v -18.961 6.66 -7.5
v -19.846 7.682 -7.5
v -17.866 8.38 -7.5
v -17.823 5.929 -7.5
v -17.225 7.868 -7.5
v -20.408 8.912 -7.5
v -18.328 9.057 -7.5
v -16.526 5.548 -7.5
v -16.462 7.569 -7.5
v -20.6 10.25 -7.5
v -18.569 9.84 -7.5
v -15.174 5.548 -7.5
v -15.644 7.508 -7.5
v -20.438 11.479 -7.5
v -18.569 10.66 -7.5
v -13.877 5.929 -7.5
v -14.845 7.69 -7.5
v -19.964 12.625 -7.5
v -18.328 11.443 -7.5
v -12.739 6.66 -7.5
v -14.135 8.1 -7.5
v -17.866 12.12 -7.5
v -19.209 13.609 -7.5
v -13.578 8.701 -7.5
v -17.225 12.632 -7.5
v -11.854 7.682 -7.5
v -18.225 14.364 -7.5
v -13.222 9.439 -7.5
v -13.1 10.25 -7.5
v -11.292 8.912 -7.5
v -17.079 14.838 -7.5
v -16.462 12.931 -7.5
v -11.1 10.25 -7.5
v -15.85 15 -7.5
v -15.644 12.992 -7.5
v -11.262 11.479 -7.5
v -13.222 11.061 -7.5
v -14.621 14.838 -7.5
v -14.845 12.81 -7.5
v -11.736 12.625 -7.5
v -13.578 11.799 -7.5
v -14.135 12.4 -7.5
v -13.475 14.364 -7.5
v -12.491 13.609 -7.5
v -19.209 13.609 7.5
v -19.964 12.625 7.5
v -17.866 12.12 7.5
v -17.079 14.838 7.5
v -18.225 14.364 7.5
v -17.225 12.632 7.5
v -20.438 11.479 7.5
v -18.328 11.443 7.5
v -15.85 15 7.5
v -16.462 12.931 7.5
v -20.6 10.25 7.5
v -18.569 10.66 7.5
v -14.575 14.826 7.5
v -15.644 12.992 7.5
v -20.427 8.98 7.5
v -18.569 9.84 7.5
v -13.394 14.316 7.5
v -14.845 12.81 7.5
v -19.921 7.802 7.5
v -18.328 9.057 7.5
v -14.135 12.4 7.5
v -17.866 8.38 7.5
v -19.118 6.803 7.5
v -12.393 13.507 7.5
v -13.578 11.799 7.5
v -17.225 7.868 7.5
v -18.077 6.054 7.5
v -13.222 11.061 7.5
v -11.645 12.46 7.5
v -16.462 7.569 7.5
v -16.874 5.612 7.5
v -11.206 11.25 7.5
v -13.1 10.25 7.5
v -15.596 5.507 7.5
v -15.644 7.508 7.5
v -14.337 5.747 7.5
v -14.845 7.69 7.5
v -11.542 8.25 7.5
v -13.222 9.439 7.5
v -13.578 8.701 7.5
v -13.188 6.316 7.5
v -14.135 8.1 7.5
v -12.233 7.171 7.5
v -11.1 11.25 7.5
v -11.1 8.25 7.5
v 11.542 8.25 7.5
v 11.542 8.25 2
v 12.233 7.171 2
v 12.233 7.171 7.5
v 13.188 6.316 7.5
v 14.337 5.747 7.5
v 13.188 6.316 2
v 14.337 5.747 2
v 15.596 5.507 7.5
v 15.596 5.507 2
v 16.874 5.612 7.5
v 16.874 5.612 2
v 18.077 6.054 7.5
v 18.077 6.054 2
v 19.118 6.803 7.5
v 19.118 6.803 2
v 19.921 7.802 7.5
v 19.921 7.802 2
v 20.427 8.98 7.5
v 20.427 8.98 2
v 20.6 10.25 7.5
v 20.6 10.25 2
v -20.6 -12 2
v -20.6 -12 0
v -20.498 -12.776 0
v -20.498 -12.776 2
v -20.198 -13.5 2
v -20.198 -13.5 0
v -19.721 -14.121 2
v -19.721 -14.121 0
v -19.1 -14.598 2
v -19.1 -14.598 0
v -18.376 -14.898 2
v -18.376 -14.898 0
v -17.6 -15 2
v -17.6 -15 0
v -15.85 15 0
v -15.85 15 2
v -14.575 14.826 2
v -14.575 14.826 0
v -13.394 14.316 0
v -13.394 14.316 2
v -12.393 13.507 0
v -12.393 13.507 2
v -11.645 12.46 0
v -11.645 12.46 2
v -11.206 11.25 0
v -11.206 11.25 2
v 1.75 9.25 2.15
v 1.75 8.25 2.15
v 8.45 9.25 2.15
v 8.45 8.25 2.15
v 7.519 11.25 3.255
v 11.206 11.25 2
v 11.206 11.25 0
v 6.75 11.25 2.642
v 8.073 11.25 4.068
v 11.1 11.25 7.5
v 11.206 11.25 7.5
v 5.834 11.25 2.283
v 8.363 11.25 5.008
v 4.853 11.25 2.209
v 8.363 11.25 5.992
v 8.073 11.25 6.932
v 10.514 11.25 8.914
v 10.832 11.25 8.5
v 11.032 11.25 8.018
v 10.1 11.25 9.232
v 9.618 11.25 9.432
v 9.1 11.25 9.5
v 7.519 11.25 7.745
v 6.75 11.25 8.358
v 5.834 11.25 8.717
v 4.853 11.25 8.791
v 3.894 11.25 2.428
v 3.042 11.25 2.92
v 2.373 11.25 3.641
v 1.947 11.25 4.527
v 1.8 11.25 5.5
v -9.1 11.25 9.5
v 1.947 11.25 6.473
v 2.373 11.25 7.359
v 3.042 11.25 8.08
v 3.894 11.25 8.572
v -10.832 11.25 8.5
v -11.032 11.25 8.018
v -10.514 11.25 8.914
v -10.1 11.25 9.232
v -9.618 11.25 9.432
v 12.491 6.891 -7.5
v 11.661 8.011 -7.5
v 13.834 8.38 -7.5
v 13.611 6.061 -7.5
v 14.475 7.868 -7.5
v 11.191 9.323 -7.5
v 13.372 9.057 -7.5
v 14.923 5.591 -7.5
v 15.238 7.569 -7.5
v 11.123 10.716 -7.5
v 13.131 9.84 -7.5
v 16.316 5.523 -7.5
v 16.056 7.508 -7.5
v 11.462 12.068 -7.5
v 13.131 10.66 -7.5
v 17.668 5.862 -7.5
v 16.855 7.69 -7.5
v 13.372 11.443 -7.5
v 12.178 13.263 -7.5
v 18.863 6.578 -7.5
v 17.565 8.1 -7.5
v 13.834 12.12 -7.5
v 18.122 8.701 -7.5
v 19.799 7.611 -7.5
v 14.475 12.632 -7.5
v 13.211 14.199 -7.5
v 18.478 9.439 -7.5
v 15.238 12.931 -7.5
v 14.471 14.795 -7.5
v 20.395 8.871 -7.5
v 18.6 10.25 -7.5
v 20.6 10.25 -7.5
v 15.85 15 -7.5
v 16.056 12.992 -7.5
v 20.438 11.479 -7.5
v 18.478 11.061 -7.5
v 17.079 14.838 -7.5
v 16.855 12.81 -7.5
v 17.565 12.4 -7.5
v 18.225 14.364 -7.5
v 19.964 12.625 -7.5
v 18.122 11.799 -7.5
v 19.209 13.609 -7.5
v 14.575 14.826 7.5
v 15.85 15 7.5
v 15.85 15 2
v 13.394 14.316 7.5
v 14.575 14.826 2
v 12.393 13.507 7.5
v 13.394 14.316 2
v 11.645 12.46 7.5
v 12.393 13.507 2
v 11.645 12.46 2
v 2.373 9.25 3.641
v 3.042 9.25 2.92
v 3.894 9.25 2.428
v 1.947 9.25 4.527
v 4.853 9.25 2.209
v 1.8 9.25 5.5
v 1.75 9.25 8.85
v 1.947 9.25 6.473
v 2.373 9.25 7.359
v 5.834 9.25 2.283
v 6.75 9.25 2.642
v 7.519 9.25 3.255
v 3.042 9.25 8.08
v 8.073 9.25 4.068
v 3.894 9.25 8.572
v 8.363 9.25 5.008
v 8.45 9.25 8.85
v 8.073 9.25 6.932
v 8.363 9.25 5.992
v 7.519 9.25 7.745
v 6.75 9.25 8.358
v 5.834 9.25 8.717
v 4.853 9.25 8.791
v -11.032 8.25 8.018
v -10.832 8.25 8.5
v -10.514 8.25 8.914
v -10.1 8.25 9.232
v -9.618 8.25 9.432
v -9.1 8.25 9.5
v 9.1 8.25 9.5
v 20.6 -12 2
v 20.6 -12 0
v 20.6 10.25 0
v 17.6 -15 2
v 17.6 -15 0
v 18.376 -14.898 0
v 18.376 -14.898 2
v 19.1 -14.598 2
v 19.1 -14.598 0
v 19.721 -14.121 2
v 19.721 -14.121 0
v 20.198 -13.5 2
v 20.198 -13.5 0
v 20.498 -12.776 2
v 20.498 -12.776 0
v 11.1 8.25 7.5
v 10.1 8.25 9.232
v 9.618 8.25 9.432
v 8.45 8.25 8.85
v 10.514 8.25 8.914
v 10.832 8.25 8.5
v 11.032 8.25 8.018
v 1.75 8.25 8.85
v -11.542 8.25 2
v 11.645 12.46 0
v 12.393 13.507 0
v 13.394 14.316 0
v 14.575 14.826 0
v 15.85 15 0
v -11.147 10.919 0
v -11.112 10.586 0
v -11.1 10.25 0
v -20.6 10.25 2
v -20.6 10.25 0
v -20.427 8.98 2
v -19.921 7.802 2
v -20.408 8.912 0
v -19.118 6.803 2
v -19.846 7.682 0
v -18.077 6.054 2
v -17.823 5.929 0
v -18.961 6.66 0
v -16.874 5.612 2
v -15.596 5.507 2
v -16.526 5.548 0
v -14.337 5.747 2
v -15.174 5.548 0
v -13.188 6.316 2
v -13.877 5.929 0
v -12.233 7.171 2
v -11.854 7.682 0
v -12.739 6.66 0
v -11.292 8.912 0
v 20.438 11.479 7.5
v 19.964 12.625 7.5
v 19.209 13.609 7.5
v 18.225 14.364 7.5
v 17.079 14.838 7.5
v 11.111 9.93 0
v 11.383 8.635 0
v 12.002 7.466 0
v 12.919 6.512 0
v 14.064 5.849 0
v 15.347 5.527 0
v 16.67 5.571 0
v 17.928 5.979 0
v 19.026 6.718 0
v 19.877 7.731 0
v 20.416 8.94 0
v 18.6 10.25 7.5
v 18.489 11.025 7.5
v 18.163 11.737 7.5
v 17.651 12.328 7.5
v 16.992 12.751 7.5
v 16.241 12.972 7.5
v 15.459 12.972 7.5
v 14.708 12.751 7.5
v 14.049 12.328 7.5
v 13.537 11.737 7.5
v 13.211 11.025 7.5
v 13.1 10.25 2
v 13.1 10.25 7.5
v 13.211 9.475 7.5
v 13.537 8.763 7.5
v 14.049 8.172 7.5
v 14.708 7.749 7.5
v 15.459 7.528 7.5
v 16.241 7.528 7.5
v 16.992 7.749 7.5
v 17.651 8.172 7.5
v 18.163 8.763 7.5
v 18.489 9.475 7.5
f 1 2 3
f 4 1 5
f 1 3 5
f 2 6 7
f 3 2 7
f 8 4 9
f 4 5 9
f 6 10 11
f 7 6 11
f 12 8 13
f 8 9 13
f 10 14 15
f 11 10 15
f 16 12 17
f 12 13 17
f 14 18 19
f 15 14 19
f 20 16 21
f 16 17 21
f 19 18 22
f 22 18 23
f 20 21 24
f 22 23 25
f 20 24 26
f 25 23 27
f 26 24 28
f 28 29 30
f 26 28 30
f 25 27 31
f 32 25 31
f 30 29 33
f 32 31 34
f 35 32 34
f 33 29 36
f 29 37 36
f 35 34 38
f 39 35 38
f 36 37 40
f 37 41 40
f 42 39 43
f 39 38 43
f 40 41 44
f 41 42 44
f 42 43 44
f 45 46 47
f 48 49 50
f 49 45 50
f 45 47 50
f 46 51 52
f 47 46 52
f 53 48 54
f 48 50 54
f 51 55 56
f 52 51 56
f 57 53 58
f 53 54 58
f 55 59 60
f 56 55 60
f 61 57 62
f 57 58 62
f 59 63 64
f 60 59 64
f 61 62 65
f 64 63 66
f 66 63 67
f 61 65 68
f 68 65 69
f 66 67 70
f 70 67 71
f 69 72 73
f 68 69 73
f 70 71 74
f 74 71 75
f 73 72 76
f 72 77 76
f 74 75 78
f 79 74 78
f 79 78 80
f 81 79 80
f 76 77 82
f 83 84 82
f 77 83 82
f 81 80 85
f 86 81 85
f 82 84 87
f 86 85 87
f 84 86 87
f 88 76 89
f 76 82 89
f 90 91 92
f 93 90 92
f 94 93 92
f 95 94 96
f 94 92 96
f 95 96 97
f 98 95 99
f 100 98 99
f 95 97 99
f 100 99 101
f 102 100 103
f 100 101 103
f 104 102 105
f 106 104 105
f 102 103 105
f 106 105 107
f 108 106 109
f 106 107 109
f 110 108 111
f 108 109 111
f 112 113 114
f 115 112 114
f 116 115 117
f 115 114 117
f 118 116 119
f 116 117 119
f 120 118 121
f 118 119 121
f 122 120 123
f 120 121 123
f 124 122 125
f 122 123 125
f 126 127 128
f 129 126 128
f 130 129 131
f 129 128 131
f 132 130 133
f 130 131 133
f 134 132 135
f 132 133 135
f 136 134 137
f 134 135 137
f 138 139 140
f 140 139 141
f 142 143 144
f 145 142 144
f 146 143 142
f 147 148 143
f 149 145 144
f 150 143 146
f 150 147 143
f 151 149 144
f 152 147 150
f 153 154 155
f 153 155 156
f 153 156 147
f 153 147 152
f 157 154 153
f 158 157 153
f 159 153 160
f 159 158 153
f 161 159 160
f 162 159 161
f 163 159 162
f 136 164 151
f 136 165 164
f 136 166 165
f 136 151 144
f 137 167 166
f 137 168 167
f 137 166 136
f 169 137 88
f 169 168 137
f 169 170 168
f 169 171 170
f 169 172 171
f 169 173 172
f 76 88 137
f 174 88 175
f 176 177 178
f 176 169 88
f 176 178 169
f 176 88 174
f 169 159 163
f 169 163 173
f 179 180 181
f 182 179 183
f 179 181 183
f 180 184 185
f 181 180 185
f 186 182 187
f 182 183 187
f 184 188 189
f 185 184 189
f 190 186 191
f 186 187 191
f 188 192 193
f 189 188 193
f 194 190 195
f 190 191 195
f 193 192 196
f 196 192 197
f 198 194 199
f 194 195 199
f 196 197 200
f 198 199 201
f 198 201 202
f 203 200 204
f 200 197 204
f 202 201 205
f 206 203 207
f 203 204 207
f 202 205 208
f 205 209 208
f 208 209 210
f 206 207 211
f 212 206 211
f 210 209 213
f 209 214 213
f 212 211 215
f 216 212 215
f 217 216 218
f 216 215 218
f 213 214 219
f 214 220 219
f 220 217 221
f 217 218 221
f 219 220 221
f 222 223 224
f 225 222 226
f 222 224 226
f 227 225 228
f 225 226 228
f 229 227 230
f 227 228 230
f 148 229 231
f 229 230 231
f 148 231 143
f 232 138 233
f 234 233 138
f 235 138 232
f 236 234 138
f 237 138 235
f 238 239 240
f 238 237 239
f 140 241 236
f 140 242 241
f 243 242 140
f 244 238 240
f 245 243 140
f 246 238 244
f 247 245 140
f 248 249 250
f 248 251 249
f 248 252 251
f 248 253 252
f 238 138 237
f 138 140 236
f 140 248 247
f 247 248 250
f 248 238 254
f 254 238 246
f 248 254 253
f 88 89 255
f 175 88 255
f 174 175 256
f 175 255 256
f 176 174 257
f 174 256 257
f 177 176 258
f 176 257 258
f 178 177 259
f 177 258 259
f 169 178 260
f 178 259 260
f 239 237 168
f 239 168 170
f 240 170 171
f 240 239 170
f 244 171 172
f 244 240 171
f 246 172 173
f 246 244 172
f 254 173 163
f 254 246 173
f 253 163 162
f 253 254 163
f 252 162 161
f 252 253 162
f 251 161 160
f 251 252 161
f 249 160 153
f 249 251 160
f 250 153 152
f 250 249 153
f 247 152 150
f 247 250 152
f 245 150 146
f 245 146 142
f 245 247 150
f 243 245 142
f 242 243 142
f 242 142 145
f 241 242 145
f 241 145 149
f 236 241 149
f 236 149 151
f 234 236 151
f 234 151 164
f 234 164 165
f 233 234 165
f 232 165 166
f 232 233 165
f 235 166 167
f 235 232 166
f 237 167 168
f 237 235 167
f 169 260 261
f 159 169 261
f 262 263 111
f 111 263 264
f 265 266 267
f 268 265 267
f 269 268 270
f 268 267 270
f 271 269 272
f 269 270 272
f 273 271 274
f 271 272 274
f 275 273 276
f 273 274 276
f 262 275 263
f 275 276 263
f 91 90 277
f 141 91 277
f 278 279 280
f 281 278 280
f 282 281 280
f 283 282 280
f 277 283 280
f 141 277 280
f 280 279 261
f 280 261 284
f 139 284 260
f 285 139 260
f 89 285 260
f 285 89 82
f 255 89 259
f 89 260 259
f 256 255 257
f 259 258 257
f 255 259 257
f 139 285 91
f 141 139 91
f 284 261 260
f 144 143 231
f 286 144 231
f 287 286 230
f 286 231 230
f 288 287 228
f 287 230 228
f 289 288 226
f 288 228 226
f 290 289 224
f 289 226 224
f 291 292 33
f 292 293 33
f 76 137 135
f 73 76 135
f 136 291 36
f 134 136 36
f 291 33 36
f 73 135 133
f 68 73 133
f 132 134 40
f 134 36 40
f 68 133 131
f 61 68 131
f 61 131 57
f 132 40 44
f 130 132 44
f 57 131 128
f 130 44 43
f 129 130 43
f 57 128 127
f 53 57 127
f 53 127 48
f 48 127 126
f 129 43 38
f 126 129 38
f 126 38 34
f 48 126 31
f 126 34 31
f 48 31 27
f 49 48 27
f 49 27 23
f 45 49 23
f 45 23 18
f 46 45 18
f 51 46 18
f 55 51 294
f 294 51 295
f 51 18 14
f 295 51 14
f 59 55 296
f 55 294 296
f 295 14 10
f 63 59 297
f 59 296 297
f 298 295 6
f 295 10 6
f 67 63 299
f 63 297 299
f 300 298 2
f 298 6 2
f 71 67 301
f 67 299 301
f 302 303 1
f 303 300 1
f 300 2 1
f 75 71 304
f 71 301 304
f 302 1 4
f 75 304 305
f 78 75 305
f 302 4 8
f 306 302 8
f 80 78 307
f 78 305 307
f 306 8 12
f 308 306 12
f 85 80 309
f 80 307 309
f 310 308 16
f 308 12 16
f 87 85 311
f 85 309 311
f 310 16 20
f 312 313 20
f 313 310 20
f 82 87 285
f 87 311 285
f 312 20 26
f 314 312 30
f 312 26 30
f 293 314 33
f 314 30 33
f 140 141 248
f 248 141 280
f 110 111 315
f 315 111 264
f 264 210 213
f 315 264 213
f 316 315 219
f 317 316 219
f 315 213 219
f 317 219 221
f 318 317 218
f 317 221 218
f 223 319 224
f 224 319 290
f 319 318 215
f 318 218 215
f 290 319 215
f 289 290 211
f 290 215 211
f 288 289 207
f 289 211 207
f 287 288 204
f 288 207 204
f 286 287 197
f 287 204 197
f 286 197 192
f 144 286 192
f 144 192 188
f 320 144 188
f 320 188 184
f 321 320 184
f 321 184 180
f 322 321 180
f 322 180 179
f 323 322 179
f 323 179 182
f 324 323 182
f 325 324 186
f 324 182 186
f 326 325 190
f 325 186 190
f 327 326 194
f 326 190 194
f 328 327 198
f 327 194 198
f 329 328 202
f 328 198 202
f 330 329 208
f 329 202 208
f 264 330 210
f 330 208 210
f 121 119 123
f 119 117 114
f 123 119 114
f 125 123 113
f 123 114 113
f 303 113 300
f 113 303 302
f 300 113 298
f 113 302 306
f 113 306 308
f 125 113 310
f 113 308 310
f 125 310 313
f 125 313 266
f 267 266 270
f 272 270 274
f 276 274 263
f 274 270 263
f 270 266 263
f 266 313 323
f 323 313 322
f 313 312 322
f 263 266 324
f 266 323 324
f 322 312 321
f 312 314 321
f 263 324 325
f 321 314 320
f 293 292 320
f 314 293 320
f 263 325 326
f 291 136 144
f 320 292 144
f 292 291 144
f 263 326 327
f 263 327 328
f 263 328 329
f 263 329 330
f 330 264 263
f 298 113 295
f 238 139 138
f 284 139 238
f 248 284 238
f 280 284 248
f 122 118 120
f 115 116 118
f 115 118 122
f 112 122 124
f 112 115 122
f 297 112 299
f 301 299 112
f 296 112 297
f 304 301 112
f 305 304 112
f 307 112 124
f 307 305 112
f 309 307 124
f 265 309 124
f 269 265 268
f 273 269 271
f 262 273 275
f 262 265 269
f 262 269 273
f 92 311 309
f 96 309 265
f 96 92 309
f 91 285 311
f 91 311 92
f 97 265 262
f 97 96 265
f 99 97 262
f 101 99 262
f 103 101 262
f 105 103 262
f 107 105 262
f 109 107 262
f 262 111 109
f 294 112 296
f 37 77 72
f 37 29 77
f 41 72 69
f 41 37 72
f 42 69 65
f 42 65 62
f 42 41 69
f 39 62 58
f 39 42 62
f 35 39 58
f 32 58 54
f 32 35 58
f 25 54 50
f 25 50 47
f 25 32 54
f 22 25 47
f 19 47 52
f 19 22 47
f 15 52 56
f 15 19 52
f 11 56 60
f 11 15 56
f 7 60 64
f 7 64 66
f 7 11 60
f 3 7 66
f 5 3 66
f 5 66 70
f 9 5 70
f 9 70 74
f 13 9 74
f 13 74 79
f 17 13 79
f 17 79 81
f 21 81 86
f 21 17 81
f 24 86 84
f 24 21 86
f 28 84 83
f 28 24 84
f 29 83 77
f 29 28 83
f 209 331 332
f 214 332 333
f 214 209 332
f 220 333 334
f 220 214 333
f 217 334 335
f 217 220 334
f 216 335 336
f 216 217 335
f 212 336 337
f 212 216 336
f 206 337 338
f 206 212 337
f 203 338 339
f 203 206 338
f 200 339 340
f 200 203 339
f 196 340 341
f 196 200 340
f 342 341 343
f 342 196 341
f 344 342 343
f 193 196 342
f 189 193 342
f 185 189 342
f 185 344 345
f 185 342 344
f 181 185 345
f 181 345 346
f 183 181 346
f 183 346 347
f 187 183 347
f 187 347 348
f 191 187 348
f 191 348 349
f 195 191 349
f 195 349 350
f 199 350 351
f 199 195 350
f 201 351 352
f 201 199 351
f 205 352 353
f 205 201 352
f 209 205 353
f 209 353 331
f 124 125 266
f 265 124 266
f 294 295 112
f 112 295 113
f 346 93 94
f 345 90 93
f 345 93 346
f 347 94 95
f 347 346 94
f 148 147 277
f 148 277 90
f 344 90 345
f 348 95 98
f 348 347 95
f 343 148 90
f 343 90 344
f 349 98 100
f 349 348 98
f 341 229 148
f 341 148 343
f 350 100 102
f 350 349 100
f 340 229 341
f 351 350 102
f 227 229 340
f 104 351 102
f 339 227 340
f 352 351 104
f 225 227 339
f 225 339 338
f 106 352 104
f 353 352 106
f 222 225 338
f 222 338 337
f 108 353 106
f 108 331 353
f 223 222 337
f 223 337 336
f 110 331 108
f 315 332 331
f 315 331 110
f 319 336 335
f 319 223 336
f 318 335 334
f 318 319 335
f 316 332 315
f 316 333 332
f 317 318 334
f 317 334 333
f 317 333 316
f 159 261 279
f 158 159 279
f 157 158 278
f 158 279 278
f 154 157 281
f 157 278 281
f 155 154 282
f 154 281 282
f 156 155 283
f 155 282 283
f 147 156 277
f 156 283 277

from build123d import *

# Parameters (mm, degrees)
F1_DEPTH      = 2
F0_R          = 2.75
F2_DEPTH      = 7.5
F4_R          = 3.3
F5_DEPTH      = 1
F5_DEPTH_BACK = 2
F7_DEPTH      = 2
F8_W          = 6.7
F8_H          = 6.7
F8_R          = 3.3
F9_DEPTH      = 1


# Not quite as in the source:
# - after a boolean that leaves OpenCascade's solid faulty, fix() repairs it


with BuildPart() as f1:
    # F0 (on Top) → F1 (new body)
    with BuildSketch(Plane.XY):
        with BuildLine():
            ThreePointArc((20.6, 10.25), (12.4912427894, 6.8912427894), (15.85, 15))
            Line((15.85, 15), (-15.85, 15))
            ThreePointArc((-15.85, 15), (-12.4912427894, 13.6087572106), (-11.1, 10.25))
            ThreePointArc((-11.1, 10.25), (-15.85, 5.5), (-20.6, 10.25))
            Line((-20.6, 10.25), (-20.6, -12))
            ThreePointArc((-20.6, -12), (-19.7213203436, -14.1213203436), (-17.6, -15))
            Line((-17.6, -15), (17.6, -15))
            ThreePointArc((17.6, -15), (19.7213203436, -14.1213203436), (20.6, -12))
            Line((20.6, -12), (20.6, 10.25))
        make_face()
    extrude(amount=F1_DEPTH)

    # F0 (on Top) → F2 (join, symmetric)
    with BuildSketch(Plane.XY):
        with BuildLine():
            ThreePointArc((-11.1, 10.25), (-12.4912427894, 13.6087572106), (-15.85, 15))
            ThreePointArc((-15.85, 15), (-19.2087572106, 13.6087572106), (-20.6, 10.25))
            ThreePointArc((-20.6, 10.25), (-15.85, 5.5), (-11.1, 10.25))
        make_face()
        with Locations((-15.85, 10.25)):
            Circle(F0_R, mode=Mode.SUBTRACT)
        with BuildLine():
            ThreePointArc((20.6, 10.25), (19.2087572106, 13.6087572106), (15.85, 15))
            ThreePointArc((15.85, 15), (12.4912427894, 6.8912427894), (20.6, 10.25))
        make_face()
        with Locations((15.85, 10.25)):
            Circle(F0_R, mode=Mode.SUBTRACT)
    extrude(amount=F2_DEPTH, both=True)

    # F4 (on line) → F5 (join, two sides)
    with BuildSketch(Plane(origin=(0, 10.25, 0), x_dir=(-1, 0, 0), z_dir=(0, 1, 0))) as f5_sk:
        with BuildLine():
            Line((-13.1, 7.5), (-13.1, 2))
            Line((-13.1, 2), (-11.1, 2))
            Line((-11.1, 2), (11.1, 2))
            Line((11.1, 2), (13.1, 2))
            Line((13.1, 2), (13.1, 7.5))
            Line((13.1, 7.5), (11.1, 7.5))
            ThreePointArc((11.1, 7.5), (10.5142135624, 8.9142135624), (9.1, 9.5))
            Line((9.1, 9.5), (-9.1, 9.5))
            ThreePointArc((-9.1, 9.5), (-10.5142135624, 8.9142135624), (-11.1, 7.5))
            Line((-11.1, 7.5), (-13.1, 7.5))
        make_face()
        with Locations((-5.1, 5.5)):
            Circle(F4_R, mode=Mode.SUBTRACT)
    extrude(amount=F5_DEPTH)
    extrude(f5_sk.sketch, amount=-F5_DEPTH_BACK)

    # F6 (on face) → F7 (cut, through all)
    with BuildSketch(Plane.XY.offset(2)):
        with BuildLine():
            ThreePointArc((-15.85, 15), (-12.8656659034, 13.9454363748), (-11.2064560947, 11.25))
            Line((-11.2064560947, 11.25), (11.2064560947, 11.25))
            ThreePointArc((11.2064560947, 11.25), (12.8656659034, 13.9454363748), (15.85, 15))
            Line((15.85, 15), (-15.85, 15))
        make_face()
    extrude(amount=-F7_DEPTH, mode=Mode.SUBTRACT)

    # F8 (on face) → F9 (cut)
    with BuildSketch(Plane.XZ.offset(-8.25)):
        with Locations((5.1, 5.5)):
            Rectangle(F8_W, F8_H)
        with Locations((5.1, 5.5)):
            Circle(F8_R, mode=Mode.SUBTRACT)
        with Locations((5.1, 5.5)):
            Circle(F8_R)
    extrude(amount=-F9_DEPTH, mode=Mode.SUBTRACT)

    add(f1.part.fix(), mode=Mode.REPLACE)


solid = f1.part
